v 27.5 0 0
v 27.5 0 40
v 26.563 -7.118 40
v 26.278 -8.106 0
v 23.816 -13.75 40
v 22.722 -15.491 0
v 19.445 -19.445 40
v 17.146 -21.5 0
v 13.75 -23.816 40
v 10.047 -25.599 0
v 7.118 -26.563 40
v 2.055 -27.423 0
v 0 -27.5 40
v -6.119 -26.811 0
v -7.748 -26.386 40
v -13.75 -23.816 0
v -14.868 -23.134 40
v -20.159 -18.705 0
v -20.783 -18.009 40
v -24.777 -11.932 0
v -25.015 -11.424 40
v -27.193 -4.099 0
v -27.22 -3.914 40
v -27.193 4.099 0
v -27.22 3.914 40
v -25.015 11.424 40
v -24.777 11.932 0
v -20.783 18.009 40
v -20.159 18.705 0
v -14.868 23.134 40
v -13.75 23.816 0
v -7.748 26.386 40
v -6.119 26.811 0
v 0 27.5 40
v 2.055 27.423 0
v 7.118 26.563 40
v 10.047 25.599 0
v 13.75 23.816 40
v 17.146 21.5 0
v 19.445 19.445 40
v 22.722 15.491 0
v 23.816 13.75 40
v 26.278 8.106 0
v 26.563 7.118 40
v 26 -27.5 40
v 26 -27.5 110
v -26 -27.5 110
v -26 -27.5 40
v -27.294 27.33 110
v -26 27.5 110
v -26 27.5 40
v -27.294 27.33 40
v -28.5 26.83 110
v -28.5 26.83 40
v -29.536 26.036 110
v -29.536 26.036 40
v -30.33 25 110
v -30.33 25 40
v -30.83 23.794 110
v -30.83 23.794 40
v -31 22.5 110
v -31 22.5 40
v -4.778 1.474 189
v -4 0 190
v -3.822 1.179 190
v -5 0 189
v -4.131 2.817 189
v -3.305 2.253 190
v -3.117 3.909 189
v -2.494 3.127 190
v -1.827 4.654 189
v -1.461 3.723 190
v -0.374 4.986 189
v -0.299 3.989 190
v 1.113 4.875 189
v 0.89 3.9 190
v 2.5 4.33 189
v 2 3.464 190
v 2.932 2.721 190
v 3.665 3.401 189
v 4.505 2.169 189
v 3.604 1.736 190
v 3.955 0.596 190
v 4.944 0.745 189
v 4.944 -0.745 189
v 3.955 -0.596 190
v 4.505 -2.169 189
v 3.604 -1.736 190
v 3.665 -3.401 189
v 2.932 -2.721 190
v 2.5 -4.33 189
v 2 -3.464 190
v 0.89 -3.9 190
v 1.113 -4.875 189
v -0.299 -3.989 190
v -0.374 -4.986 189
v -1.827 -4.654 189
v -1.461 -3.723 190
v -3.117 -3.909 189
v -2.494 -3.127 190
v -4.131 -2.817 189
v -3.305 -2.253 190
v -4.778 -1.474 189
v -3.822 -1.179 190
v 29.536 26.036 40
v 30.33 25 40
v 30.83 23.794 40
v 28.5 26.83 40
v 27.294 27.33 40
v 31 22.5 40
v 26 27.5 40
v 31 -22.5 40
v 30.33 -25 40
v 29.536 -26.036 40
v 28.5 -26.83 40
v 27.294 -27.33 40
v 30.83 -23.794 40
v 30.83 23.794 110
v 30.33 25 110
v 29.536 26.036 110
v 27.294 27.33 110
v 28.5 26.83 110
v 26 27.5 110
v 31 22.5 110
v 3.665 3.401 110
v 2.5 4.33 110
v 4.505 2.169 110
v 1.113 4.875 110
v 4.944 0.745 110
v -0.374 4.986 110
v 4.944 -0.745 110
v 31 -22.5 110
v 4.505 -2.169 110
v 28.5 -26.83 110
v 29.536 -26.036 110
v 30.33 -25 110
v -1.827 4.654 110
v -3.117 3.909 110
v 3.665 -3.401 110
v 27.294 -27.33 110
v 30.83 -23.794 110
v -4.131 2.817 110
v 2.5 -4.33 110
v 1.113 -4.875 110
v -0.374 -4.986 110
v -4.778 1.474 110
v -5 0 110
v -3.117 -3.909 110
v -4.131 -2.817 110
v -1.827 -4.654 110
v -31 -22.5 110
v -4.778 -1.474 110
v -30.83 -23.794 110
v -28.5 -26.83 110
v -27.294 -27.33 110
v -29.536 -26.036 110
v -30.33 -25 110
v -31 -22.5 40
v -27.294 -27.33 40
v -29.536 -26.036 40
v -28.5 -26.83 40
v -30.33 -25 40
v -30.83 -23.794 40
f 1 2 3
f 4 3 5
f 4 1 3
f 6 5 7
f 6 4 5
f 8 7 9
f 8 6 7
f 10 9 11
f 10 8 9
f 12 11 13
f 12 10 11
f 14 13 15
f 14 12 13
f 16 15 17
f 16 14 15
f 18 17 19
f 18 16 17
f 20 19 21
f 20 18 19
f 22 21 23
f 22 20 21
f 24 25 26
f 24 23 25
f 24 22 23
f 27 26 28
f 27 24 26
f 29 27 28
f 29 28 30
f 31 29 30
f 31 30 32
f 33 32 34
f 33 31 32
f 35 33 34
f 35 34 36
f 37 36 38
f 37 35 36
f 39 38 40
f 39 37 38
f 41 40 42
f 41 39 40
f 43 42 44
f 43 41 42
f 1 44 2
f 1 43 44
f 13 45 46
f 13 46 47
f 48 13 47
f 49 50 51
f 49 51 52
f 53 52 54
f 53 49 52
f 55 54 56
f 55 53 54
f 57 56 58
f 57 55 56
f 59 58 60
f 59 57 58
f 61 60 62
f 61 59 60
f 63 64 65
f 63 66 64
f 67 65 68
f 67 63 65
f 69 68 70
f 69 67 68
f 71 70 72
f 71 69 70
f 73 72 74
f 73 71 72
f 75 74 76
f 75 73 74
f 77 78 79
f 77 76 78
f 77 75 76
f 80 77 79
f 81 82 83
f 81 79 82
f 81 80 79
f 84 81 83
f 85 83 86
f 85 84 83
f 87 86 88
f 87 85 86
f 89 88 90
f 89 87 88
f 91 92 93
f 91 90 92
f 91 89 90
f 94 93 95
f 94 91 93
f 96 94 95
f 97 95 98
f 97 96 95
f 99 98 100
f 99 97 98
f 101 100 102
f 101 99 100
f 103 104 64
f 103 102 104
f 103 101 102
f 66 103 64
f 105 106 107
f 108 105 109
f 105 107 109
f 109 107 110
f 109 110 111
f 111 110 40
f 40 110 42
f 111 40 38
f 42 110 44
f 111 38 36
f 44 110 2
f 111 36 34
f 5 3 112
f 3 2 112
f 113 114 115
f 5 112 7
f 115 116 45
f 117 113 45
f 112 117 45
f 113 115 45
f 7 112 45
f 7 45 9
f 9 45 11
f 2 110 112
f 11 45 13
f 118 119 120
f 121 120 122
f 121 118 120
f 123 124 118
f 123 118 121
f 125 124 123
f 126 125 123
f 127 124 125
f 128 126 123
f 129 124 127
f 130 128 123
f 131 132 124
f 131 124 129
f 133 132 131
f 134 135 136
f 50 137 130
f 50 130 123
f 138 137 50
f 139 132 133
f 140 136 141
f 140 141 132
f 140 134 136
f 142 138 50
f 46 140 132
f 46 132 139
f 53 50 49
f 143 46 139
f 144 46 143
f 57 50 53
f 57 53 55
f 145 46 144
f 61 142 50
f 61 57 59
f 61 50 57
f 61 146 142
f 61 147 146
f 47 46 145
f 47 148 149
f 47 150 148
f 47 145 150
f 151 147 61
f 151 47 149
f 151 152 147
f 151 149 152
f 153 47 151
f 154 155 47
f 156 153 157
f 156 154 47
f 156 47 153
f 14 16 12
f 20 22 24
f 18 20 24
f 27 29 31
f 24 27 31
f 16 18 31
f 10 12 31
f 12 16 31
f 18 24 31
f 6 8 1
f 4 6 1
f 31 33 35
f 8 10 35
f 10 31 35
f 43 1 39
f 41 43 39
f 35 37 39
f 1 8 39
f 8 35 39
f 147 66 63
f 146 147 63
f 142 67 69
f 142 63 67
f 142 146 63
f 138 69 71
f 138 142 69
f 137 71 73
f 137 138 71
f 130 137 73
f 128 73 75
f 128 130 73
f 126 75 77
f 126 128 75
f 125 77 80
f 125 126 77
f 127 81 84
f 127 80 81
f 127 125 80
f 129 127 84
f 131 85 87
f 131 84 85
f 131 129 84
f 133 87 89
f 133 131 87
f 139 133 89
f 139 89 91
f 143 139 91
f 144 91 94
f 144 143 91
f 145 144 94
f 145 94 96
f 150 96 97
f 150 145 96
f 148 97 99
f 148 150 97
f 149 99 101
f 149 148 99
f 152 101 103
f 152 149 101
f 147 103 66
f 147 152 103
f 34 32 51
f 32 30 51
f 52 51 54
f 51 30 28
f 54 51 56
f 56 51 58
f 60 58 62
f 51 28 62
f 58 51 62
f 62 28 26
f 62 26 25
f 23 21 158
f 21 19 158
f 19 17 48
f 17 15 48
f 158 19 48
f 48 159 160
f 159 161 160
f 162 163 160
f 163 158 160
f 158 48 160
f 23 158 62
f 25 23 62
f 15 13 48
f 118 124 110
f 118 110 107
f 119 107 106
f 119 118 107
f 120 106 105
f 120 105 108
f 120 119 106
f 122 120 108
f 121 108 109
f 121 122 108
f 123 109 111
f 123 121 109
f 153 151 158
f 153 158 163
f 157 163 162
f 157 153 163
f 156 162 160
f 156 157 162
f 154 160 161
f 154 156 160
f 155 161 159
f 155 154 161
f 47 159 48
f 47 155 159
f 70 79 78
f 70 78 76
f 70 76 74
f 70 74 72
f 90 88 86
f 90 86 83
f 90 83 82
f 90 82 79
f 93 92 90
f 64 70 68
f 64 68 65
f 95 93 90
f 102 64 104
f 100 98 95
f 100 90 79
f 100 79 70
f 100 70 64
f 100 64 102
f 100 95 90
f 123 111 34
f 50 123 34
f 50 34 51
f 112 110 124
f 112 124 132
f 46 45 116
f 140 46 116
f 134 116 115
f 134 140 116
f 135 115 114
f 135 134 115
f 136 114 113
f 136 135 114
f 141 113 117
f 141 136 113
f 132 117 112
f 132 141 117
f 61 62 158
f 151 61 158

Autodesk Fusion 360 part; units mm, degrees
sketch "Sketch1" plane through (0, 0, 0) normal (0, 0, 1) x (1, 0, 0)
  circle A0 centre (0, 0) radius 27.5
  dimension "d1" = 55
extrude "Extrude1" add sketch "Sketch1" along normal blind 40
sketch "Sketch2" plane through (0, 0, 40) normal (0, 0, 1) x (-1, 0, 0)
  circle A0 centre (0, 0) radius 27.5
  line L0 (0, -27.5) -> (-31, -27.5)
  line L1 (-31, -27.5) -> (-31, 40.6198)
  line L2 (0, 27.5) -> (-33.618, 27.5)
  line L3 (0, -27.5) -> (31, -27.5)
  line L4 (31, -27.5) -> (31, 43)
  line L5 (0, 27.5) -> (37, 27.5)
  dimension "d4" = 90
  dimension "d5" = 31
extrude "Extrude2" add sketch "Sketch2" along normal blind 70
sketch "Sketch3" plane through (0, 0, 110) normal (0, 0, 1) x (-1, 0, 0)
  line L0 (-31, -27.5) -> (31, -27.5)
  line L1 (31, -27.5) -> (31, 27.5)
  line L2 (31, 27.5) -> (-31, 27.5)
  line L3 (-31, 27.5) -> (-31, -27.5)
  circle A0 centre (0, 0) radius 5
  dimension "d8" = 10
extrude "Extrude3" add sketch "Sketch3" along normal blind 80 contours A0
sketch "Sketch4" plane through (0, 0, 0) normal (0, 1, 0) x (1, 0, 0)
chamfer "Chamfer1" distance 1 angle 45 1 edges at (4.6616, 1.8081, 190)
fillet "Fillet1" radius 5 4 edges at (31, -27.5, 75) (31, 27.5, 75) (-31, 27.5, 75) (-31, -27.5, 75)
